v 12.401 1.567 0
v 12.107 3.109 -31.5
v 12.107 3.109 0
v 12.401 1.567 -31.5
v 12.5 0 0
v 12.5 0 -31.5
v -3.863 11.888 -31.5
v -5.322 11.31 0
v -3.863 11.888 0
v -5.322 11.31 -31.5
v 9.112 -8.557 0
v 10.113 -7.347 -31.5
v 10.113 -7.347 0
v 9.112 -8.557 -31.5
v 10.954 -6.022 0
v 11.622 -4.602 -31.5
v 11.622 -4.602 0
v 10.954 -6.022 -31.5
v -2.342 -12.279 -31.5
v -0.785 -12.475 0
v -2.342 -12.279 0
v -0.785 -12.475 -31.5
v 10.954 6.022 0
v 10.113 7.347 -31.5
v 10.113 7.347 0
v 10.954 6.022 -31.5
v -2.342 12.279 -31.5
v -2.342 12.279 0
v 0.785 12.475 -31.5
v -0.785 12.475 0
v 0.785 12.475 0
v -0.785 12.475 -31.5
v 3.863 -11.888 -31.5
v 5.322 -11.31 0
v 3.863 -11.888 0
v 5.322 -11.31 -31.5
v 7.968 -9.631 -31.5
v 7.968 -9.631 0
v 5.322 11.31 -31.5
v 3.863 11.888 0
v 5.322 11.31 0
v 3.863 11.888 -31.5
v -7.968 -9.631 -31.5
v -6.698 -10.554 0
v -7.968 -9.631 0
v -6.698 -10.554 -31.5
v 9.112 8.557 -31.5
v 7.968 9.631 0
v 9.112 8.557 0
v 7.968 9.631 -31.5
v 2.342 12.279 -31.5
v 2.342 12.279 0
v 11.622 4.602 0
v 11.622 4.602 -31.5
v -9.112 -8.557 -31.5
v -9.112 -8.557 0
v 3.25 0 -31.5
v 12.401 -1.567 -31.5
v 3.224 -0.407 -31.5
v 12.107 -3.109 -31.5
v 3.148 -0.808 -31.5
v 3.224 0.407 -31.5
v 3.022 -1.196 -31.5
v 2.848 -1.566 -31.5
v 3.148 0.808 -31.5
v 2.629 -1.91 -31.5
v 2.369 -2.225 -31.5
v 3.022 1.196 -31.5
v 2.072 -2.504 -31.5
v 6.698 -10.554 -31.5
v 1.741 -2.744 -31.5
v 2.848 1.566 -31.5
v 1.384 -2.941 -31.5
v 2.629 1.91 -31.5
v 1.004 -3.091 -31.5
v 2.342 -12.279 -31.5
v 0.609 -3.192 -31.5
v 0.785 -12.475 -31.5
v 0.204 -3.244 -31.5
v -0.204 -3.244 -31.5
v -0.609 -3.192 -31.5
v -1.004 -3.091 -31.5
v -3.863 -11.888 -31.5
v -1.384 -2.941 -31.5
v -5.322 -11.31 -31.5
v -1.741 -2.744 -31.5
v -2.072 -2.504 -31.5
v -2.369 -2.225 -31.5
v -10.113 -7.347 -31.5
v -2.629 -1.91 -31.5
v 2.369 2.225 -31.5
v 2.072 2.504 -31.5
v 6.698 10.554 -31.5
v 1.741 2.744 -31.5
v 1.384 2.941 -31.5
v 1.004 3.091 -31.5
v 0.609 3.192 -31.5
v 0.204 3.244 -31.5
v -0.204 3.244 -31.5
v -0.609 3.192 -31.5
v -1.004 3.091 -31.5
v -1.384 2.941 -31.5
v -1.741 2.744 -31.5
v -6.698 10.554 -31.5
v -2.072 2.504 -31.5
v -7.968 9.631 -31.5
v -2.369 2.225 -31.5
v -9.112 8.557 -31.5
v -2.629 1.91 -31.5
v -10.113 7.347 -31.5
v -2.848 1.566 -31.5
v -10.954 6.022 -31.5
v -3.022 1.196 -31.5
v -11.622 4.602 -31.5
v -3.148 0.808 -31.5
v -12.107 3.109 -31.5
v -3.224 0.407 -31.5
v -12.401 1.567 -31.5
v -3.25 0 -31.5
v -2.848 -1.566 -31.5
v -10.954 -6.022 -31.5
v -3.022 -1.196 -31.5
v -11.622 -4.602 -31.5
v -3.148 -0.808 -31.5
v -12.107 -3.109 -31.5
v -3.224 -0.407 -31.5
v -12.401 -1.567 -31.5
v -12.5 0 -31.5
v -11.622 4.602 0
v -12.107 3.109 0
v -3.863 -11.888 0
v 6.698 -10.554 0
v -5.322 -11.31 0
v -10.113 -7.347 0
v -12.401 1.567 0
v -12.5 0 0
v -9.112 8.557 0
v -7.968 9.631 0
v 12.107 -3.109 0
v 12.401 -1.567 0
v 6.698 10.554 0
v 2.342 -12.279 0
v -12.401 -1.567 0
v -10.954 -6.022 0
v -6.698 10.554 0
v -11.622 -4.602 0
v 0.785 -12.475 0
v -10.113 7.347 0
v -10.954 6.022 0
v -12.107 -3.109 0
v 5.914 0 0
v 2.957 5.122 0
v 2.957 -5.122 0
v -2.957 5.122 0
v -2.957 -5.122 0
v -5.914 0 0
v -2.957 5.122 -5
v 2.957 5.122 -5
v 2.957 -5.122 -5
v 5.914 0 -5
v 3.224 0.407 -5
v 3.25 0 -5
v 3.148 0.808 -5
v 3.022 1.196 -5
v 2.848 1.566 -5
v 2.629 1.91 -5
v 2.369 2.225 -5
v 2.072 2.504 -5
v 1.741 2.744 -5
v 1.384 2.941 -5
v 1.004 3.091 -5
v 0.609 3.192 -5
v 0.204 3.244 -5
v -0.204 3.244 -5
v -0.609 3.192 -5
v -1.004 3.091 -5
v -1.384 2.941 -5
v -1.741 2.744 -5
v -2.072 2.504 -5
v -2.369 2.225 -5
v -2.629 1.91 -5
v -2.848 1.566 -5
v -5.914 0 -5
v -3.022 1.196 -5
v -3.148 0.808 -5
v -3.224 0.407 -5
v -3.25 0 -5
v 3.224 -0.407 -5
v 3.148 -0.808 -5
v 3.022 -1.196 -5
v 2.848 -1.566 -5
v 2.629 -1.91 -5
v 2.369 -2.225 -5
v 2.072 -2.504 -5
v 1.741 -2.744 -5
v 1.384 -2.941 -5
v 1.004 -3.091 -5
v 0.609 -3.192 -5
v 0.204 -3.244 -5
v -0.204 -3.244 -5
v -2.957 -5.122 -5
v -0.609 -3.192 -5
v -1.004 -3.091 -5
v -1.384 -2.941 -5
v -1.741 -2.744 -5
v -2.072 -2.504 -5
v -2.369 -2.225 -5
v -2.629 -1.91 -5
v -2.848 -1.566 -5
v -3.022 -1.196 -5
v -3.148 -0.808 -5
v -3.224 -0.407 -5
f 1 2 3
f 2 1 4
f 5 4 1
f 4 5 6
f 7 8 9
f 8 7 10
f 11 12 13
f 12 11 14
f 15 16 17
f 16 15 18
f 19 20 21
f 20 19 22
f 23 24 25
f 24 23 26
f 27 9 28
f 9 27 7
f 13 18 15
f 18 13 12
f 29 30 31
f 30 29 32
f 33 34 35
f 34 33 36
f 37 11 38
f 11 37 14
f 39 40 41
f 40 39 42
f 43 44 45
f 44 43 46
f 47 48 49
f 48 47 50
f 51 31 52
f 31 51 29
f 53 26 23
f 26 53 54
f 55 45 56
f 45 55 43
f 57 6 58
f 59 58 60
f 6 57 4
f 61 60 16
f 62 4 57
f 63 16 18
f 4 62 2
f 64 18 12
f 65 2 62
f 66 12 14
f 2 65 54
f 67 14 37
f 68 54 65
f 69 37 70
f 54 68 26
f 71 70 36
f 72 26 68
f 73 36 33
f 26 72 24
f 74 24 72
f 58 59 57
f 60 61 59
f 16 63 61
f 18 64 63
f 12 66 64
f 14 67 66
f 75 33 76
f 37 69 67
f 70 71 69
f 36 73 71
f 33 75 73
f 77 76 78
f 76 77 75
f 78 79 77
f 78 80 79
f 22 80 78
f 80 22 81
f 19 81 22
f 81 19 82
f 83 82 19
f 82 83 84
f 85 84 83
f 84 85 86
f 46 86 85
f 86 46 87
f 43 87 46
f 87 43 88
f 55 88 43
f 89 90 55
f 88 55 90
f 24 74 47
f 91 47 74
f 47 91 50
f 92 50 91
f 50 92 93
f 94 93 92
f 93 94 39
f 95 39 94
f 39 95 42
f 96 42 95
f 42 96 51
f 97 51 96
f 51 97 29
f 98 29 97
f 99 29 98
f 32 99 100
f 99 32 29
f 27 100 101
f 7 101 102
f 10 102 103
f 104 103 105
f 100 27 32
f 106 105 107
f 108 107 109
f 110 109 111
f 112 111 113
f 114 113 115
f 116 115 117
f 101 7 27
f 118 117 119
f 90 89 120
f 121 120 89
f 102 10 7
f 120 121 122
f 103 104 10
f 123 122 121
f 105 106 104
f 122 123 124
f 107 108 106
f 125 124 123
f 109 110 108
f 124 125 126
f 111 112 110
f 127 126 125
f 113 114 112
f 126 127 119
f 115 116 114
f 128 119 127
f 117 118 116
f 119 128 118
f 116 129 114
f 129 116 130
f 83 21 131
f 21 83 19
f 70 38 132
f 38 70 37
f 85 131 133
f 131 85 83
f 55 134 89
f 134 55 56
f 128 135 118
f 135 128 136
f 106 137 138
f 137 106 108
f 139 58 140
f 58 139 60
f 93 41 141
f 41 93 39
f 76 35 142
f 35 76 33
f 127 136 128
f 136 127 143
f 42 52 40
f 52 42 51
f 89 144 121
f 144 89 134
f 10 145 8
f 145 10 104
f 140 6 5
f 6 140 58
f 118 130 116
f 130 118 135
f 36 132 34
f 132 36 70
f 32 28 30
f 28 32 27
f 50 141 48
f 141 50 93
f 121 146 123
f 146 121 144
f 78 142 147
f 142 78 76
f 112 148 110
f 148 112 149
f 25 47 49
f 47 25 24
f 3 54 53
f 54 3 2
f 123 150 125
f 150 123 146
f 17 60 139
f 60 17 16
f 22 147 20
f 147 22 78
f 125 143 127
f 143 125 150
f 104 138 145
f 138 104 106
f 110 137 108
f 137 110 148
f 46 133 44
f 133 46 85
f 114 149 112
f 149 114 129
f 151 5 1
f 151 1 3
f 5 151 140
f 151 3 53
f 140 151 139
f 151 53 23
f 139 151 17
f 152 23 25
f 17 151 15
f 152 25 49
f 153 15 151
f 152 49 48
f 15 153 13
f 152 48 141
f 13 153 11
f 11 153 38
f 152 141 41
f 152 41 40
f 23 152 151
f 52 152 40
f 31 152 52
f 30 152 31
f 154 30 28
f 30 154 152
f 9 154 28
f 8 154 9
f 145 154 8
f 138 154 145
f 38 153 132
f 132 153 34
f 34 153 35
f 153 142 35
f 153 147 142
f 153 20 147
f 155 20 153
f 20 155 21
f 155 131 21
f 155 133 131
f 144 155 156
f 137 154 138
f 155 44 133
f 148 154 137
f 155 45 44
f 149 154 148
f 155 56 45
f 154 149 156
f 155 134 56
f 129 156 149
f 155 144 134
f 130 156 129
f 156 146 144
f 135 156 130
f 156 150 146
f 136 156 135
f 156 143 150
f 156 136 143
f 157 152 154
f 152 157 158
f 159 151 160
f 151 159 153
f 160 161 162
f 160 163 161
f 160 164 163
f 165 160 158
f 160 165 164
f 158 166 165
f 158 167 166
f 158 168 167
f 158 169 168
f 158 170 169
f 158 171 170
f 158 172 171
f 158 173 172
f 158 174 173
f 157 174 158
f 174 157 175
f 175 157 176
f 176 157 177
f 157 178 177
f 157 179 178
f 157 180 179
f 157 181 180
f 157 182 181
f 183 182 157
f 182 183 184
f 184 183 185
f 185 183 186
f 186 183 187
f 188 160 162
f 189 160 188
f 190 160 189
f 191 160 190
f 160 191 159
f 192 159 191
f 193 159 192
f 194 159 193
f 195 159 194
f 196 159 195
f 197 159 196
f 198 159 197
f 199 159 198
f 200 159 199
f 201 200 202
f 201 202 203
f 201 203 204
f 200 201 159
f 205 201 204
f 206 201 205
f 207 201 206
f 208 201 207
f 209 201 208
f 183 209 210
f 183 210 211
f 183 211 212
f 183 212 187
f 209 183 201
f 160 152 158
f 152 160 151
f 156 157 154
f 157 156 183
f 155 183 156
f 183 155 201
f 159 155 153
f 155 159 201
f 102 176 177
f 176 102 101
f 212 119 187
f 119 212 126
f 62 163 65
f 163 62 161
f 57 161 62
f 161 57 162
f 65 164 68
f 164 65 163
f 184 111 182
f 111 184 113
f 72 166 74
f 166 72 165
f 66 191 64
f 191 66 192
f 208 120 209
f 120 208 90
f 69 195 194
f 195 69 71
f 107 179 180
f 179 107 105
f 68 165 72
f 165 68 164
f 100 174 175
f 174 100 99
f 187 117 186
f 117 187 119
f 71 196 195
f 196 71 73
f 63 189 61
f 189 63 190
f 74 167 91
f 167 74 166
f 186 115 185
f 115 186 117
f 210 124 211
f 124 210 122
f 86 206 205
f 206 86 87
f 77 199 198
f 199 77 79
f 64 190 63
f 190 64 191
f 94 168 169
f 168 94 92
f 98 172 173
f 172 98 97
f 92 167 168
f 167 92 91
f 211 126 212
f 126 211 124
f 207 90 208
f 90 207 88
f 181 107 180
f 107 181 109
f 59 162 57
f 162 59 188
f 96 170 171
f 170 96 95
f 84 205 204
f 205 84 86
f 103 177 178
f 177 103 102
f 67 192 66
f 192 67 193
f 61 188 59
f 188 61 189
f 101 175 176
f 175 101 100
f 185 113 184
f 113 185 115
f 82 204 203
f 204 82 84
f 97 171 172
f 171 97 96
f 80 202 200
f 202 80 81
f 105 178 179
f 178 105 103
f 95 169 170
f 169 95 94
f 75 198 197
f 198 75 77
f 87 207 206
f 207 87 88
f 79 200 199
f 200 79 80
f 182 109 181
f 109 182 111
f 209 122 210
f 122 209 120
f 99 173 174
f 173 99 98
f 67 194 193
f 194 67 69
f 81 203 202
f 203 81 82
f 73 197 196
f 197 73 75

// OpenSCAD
$fn = 50;

difference() {
	union() {
		translate(v = [0, 0, -31.5]) {
			cylinder(h = 31.5, r = 12.5);
		}
		#translate(v = [0, 0, -33.0]) {
			cylinder(h = 33, r = 2.875);
		}
	}
	union() {
		translate(v = [0, 0, 0]) {
			rotate(a = [0, 0, 0]) {
				difference() {
					union() {
						translate(v = [0, 0, -5]) {
							linear_extrude(height = 5) {
								polygon(points = [[5.914249999999999, 0.0], [2.957125, 5.1218907443321156], [-2.9571249999999982, 5.1218907443321156], [-5.914249999999999, 7.242867331857232e-16], [-2.9571250000000022, -5.121890744332115], [2.9571249999999956, -5.121890744332118]]);
							}
						}
					}
					union();
				}
			}
		}
		#translate(v = [0, 0, -100.0]) {
			cylinder(h = 200, r = 3.25);
		}
	}
}
